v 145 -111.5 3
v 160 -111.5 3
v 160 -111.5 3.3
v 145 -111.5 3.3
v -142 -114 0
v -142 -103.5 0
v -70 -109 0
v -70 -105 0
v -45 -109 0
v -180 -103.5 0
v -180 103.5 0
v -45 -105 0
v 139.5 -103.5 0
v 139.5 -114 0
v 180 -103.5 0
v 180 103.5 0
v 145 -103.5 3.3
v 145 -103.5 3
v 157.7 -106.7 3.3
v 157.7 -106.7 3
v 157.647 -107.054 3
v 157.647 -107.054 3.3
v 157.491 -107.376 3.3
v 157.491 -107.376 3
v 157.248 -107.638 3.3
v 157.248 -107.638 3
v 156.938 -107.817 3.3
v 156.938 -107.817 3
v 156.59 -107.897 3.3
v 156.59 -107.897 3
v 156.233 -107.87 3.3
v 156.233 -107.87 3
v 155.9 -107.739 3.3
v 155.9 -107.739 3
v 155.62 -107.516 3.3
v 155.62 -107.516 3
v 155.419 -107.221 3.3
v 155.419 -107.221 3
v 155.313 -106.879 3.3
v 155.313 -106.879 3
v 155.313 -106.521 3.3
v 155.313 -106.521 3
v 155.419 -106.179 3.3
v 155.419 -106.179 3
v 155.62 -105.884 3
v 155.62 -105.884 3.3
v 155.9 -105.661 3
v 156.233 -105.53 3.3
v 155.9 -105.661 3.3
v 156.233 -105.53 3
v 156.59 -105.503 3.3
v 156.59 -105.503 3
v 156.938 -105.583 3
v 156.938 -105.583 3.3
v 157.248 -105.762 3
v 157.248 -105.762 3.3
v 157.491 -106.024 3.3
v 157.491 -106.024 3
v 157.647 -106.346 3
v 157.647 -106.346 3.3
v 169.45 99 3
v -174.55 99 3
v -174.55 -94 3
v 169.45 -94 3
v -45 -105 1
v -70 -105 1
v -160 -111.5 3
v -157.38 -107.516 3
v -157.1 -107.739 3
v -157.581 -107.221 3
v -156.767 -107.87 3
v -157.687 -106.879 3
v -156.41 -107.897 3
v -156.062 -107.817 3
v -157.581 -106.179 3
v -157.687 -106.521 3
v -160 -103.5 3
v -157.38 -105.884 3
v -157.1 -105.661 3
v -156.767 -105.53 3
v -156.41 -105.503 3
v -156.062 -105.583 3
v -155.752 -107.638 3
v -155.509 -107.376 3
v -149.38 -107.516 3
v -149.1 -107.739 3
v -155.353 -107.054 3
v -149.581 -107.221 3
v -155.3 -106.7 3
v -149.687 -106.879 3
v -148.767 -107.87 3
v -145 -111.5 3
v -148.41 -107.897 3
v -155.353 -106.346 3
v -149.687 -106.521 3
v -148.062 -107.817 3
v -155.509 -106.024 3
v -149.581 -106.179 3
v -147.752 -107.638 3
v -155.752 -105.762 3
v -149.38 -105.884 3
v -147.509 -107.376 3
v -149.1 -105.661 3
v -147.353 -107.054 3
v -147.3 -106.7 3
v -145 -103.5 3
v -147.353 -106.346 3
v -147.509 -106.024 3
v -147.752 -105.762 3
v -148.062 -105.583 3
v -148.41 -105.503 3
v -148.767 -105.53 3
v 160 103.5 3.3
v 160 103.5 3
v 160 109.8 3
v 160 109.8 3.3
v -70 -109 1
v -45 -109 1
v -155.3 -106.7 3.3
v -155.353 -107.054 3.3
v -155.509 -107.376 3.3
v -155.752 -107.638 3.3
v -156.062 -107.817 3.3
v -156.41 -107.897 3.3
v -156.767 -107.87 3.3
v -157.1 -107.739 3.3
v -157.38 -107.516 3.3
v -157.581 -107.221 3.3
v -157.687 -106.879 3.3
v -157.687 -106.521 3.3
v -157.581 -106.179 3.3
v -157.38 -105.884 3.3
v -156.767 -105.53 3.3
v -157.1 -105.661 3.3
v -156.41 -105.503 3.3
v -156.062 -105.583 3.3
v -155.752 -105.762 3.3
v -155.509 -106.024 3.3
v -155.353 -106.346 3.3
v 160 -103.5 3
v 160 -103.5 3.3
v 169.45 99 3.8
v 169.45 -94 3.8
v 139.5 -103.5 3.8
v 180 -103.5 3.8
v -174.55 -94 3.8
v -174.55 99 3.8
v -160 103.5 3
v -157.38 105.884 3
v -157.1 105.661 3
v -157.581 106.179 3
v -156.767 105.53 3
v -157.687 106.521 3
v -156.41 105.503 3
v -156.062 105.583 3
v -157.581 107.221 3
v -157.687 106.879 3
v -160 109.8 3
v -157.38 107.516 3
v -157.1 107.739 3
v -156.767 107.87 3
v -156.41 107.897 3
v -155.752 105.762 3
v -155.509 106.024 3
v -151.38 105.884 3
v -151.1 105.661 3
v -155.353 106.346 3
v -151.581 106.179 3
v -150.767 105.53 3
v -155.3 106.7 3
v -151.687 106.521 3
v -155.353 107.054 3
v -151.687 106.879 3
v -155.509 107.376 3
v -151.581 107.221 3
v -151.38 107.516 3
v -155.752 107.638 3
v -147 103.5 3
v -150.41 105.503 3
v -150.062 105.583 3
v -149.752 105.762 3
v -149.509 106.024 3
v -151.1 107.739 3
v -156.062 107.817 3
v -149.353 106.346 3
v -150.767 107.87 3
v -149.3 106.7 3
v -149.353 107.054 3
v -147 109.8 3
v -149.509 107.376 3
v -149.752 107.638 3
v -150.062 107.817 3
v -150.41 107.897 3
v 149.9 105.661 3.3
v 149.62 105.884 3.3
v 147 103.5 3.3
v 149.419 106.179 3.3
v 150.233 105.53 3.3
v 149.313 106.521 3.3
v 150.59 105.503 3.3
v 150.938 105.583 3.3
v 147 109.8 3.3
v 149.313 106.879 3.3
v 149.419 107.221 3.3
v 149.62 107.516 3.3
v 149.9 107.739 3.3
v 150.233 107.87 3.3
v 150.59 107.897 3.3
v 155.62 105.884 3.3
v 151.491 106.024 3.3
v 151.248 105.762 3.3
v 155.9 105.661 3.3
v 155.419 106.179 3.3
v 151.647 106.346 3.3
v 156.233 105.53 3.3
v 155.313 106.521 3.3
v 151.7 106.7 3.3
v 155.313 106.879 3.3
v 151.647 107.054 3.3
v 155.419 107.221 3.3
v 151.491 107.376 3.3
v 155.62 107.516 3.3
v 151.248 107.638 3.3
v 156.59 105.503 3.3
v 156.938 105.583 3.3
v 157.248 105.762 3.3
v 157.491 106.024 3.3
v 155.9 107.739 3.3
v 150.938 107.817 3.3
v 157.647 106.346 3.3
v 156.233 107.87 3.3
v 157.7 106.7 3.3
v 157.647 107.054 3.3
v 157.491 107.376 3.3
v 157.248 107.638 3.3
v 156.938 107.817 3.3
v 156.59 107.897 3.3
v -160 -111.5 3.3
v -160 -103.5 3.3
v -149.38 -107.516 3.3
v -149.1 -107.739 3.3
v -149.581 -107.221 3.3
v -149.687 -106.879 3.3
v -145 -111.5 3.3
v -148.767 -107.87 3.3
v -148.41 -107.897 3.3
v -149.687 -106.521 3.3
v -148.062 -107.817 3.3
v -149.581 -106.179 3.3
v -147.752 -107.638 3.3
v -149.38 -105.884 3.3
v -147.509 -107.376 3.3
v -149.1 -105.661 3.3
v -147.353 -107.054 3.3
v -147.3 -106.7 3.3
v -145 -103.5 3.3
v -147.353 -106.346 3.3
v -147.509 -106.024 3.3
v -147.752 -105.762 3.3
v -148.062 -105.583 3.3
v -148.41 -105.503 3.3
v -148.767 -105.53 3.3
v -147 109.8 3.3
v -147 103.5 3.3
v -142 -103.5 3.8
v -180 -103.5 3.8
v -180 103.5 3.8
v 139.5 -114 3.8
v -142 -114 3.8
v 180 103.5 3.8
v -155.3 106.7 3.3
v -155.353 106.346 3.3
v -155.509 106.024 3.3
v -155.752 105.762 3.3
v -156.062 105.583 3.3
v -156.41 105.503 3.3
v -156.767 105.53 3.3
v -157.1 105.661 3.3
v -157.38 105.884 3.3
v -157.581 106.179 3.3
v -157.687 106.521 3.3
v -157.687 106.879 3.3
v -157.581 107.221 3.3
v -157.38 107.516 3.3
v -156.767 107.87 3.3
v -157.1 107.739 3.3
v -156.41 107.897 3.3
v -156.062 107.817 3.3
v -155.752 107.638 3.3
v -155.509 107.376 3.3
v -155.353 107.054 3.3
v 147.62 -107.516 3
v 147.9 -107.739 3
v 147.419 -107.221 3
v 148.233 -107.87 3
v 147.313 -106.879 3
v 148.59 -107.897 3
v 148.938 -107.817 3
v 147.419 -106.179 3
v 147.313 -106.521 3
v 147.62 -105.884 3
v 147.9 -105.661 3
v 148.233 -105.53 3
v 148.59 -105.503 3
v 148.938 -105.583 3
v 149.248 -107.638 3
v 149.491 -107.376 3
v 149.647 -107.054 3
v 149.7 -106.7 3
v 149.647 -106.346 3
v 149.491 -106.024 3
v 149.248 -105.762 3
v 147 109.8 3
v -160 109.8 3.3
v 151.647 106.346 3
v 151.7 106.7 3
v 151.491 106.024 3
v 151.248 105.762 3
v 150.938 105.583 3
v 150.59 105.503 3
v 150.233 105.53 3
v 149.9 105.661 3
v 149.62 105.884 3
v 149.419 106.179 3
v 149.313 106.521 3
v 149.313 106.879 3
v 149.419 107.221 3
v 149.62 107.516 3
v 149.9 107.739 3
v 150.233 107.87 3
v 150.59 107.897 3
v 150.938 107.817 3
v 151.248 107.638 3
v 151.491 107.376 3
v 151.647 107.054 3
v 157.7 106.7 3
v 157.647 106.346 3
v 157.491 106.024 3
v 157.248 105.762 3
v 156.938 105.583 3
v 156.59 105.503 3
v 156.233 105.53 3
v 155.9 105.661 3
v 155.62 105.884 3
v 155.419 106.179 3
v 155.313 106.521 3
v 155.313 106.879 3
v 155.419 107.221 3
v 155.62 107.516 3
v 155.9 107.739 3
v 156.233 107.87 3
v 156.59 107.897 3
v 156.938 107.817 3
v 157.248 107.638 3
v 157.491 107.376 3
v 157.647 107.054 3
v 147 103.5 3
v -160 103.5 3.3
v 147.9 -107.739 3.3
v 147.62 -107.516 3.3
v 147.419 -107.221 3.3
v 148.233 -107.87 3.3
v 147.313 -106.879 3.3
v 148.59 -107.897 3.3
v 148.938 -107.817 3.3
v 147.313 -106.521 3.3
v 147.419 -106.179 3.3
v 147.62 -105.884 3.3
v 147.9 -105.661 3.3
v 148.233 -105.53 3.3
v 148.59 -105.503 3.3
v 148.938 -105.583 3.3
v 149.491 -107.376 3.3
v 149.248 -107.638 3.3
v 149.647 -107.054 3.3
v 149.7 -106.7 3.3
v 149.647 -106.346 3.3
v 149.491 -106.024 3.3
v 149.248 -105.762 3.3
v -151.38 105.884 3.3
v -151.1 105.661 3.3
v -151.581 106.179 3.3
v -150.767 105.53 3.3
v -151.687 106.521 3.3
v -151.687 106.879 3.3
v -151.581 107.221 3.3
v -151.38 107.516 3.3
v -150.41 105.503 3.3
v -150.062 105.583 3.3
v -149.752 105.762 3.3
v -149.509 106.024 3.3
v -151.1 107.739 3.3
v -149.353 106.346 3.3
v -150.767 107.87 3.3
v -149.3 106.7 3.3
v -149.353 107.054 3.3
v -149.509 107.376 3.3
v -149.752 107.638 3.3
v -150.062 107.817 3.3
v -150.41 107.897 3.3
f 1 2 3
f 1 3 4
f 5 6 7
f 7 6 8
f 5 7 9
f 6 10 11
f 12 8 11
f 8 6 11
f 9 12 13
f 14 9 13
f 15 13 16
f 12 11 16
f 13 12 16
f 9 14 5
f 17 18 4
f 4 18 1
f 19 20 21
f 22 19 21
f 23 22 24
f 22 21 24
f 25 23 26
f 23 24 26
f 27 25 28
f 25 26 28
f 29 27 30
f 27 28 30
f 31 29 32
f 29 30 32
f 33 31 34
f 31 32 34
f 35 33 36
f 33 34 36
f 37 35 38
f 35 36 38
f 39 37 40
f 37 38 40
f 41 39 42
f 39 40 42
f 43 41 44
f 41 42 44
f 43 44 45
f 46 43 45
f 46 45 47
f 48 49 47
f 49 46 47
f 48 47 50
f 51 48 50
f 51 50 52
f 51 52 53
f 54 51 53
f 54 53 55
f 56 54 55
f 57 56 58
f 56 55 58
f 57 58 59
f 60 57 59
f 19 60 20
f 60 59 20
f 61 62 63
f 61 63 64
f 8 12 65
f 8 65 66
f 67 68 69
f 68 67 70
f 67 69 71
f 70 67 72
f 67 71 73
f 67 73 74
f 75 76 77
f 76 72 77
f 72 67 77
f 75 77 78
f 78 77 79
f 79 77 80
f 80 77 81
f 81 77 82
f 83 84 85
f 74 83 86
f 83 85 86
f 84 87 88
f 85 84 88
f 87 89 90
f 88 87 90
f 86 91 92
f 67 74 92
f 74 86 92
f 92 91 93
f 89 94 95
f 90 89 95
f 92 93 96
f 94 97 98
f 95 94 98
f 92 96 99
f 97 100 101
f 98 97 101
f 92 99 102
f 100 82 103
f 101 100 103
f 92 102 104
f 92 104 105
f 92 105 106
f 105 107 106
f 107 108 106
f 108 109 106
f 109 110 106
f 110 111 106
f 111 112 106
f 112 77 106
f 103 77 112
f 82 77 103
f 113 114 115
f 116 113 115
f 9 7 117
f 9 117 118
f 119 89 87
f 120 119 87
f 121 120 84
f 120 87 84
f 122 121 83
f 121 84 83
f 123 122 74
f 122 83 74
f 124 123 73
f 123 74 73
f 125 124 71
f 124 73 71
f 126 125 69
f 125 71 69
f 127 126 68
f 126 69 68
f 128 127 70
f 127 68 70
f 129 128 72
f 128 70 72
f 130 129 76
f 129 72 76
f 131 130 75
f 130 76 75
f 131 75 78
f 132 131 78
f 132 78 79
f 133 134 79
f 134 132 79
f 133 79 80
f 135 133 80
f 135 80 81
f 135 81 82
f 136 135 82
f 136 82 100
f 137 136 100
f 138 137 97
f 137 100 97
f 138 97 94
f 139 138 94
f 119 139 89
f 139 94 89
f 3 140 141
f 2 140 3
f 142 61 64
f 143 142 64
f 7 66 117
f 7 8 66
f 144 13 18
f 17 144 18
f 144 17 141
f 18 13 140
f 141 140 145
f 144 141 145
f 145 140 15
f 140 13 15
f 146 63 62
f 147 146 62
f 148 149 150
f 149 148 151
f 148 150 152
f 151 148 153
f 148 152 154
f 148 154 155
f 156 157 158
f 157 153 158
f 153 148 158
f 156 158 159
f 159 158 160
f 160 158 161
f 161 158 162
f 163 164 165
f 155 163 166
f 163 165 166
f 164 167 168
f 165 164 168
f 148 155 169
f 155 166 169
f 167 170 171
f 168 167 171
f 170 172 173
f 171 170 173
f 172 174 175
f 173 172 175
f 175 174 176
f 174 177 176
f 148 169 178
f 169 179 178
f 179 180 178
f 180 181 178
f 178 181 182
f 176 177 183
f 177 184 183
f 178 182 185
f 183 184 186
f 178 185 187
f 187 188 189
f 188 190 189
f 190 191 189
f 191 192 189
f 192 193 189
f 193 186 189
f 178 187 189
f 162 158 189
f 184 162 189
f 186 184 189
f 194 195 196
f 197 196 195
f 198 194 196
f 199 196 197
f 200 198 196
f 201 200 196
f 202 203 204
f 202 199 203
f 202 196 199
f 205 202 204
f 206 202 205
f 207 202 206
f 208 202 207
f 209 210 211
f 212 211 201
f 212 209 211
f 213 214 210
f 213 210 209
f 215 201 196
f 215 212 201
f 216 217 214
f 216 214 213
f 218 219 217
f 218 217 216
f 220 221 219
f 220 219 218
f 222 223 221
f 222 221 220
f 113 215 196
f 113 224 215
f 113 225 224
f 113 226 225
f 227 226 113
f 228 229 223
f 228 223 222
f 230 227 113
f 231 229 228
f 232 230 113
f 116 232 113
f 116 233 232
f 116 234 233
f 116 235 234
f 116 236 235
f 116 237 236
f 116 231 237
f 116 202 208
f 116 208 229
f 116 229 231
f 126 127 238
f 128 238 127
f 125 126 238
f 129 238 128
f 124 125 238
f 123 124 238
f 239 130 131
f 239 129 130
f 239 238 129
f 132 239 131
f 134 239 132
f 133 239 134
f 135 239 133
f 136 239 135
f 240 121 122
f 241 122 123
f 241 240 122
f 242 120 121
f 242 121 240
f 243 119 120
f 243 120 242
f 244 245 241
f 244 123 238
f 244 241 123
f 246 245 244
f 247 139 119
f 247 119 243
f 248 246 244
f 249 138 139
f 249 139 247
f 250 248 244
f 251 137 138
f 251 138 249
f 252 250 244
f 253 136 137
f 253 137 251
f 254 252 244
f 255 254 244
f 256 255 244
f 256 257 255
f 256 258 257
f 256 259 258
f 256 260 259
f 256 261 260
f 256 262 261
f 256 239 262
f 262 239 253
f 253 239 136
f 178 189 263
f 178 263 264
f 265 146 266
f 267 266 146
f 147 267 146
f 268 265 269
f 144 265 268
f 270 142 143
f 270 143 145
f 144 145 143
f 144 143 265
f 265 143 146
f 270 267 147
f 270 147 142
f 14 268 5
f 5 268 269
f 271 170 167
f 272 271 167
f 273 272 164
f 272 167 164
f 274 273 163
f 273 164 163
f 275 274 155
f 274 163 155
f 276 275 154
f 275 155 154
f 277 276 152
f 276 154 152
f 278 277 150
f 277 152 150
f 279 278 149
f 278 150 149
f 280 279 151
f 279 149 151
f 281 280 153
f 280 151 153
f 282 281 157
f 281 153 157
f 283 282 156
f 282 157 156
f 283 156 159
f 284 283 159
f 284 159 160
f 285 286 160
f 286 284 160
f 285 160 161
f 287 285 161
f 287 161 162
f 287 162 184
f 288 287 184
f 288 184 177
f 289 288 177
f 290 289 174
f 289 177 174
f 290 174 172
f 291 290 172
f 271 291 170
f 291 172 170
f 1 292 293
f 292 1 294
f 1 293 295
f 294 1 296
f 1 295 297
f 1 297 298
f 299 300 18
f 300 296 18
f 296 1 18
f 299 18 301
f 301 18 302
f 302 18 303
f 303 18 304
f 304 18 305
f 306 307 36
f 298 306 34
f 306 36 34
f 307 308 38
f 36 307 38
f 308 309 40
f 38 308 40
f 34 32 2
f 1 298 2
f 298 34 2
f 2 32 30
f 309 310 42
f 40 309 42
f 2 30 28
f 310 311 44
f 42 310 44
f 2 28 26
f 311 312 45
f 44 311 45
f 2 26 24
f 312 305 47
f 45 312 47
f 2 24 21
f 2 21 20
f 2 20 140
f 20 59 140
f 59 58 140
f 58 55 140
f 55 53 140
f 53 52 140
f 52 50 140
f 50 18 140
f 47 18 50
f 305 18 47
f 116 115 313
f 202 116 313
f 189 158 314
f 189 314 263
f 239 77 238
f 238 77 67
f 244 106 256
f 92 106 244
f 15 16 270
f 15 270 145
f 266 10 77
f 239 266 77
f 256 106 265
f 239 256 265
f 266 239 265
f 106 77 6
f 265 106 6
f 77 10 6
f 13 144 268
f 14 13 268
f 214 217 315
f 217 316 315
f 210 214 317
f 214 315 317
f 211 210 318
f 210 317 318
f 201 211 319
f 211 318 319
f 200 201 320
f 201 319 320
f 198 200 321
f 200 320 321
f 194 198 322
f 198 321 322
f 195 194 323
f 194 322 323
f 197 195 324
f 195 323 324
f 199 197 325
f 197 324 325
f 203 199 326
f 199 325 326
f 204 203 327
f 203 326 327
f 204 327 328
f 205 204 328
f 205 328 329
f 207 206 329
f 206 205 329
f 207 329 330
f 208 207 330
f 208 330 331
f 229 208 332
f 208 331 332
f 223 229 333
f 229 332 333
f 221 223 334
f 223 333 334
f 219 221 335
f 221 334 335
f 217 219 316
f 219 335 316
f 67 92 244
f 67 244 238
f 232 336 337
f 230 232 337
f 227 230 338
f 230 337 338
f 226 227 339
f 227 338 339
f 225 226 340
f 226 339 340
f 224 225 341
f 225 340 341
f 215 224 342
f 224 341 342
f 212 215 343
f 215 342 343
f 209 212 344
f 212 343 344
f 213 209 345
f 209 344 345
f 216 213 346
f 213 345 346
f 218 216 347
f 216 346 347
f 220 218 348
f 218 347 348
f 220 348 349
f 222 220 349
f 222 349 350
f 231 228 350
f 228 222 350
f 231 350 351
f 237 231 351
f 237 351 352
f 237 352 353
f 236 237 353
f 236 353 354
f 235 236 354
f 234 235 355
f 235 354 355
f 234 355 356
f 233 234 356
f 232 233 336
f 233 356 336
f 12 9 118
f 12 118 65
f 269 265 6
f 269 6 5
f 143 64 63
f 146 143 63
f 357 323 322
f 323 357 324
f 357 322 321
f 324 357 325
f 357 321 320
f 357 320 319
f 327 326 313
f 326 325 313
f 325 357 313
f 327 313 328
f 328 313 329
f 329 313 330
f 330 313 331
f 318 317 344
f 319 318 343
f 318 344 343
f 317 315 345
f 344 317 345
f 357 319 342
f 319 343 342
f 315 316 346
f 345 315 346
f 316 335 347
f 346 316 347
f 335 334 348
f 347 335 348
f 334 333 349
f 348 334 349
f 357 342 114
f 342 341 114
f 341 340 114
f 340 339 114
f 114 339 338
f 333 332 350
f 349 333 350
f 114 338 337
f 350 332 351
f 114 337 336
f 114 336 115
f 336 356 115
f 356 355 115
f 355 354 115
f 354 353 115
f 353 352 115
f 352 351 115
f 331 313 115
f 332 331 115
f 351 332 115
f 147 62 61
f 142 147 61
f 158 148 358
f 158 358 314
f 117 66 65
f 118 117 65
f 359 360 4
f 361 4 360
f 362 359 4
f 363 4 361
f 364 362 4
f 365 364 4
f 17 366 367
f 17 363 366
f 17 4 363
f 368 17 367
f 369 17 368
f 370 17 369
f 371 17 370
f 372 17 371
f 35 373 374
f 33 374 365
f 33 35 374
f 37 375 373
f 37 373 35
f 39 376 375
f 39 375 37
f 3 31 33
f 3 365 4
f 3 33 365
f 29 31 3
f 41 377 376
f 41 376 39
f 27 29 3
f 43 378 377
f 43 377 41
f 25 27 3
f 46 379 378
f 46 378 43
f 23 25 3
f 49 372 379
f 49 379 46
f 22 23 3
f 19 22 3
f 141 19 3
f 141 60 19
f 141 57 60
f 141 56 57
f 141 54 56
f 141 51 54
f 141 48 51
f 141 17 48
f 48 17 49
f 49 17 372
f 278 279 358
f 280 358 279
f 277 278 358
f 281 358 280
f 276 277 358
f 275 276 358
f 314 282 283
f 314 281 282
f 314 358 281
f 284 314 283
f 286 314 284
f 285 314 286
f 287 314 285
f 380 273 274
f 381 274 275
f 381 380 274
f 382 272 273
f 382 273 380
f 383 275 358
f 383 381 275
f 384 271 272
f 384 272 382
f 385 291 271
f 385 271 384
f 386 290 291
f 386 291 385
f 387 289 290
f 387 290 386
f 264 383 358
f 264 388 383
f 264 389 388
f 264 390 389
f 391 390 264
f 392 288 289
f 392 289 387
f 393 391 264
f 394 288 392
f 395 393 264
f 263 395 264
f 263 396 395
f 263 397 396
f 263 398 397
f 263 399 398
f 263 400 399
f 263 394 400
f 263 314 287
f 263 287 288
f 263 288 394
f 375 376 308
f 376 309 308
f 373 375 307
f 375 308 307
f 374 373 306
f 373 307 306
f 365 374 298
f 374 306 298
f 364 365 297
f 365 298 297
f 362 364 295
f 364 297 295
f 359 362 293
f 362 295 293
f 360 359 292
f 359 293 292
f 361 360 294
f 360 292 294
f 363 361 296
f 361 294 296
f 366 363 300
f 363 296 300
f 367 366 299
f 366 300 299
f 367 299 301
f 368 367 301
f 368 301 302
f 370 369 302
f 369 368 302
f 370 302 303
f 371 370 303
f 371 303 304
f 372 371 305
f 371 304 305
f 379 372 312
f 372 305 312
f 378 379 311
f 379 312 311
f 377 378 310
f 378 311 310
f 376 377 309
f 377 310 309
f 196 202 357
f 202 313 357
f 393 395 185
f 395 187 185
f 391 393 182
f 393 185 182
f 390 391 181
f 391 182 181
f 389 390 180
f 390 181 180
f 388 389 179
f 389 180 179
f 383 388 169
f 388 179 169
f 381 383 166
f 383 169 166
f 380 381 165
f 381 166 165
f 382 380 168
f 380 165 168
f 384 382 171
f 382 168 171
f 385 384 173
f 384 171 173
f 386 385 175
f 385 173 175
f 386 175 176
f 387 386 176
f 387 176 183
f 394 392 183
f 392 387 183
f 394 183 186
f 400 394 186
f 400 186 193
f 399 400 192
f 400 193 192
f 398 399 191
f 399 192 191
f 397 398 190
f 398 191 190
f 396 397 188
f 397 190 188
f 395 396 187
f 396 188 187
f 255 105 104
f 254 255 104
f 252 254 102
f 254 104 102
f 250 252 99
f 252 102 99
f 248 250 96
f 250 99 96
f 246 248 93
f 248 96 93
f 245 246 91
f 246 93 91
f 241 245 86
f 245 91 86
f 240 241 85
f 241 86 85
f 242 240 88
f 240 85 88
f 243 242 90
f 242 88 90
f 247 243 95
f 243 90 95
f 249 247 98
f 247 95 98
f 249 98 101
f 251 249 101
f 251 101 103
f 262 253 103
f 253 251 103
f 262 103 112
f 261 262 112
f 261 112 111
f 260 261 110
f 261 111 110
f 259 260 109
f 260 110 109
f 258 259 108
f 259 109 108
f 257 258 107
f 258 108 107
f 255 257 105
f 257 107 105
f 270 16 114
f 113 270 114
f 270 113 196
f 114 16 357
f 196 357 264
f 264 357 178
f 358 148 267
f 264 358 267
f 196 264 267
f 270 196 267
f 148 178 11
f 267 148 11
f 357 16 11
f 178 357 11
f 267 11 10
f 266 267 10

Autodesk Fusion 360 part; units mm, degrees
sketch "Panel_Dims" plane through (0, 0, 0) normal (0, 0, 1) x (1, 0, 0)
  line L0 (-180, 103.5) -> (180, 103.5) construction
  line L1 (180, 103.5) -> (180, -103.5) construction
  line L2 (180, -103.5) -> (-180, -103.5) construction
  line L3 (-180, -103.5) -> (-180, 103.5) construction
  line L4 (0, 0) -> (0, 103.5) construction
  line L5 (0, 0) -> (-180, 0) construction
  line L6 (-160, -103.5) -> (-160, -111.5)
  line L7 (-145, -103.5) -> (-145, -111.5)
  line L8 (-145, -111.5) -> (-160, -111.5)
  line L9 (-142, -103.5) -> (-142, -114)
  line L10 (160, -103.5) -> (160, -111.5)
  line L11 (145, -103.5) -> (145, -111.5)
  line L12 (160, -111.5) -> (145, -111.5)
  line L13 (139.5, -103.5) -> (139.5, -114)
  line L14 (139.5, -114) -> (-142, -114)
  line L15 (-160, 103.5) -> (-160, 109.8)
  line L16 (-160, 109.8) -> (-147, 109.8)
  line L17 (-147, 109.8) -> (-147, 103.5)
  line L18 (160, 103.5) -> (160, 109.8)
  line L19 (160, 109.8) -> (147, 109.8)
  line L20 (147, 109.8) -> (147, 103.5)
  line L21 (-180, 103.5) -> (-180, -103.5)
  line L22 (-180, -103.5) -> (-160, -103.5)
  line L23 (-145, -103.5) -> (-142, -103.5)
  line L24 (145, -103.5) -> (139.5, -103.5)
  line L25 (160, -103.5) -> (180, -103.5)
  line L26 (180, 103.5) -> (180, -103.5)
  line L27 (-160, 103.5) -> (-180, 103.5)
  line L28 (-147, 103.5) -> (147, 103.5)
  line L29 (160, 103.5) -> (180, 103.5)
  line L30 (-142, -103.5) -> (139.5, -103.5)
  circle A0 centre (-156.5, -106.7) radius 1.2
  circle A1 centre (-148.5, -106.7) radius 1.2
  line L31 (-156.5, -106.7) -> (-148.5, -106.7) construction
  circle A2 centre (148.5, -106.7) radius 1.2
  line L32 (148.5, -106.7) -> (156.5, -106.7) construction
  circle A3 centre (156.5, -106.7) radius 1.2
  circle A4 centre (-156.5, 106.7) radius 1.2
  line L33 (-156.5, 106.7) -> (-150.5, 106.7) construction
  circle A5 centre (-150.5, 106.7) radius 1.2
  circle A6 centre (150.5, 106.7) radius 1.2
  line L34 (150.5, 106.7) -> (156.5, 106.7) construction
  circle A7 centre (156.5, 106.7) radius 1.2
  line L35 (-174.55, 99) -> (169.45, 99)
  line L36 (169.45, 99) -> (169.45, -94)
  line L37 (169.45, -94) -> (-174.55, -94)
  line L38 (-174.55, -94) -> (-174.55, 99)
  line L39 (145, -103.5) -> (160, -103.5)
  line L40 (147, 103.5) -> (160, 103.5)
  line L41 (-147, 103.5) -> (-160, 103.5)
  line L42 (-160, -103.5) -> (-145, -103.5)
  line L43 (-73, -103.5) -> (-43, -103.5)
  line L44 (-43, -103.5) -> (-43, -114)
  line L45 (-43, -114) -> (-73, -114)
  line L46 (-73, -114) -> (-73, -103.5)
  line L47 (-45, -105) -> (-70, -105)
  line L48 (-70, -105) -> (-70, -109)
  line L49 (-70, -109) -> (-45, -109)
  line L50 (-45, -109) -> (-45, -105)
  point P0 (-156.5, -106.7)
  dimension "panel_w" = 360
  dimension "panel_h" = 207
  dimension "ear_indent" = 20
  dimension "ear_bottom_w" = 15
  dimension "ear_bottom_h" = 8
  dimension "pcb_left_indent" = 38
  dimension "d37" = 20
  dimension "d40" = 8
  dimension "pcb_chin_h" = 10.5
  dimension "pcb_chin_w" = 281.5
  dimension "d45" = 20
  dimension "ear_top_h" = 6.3
  dimension "ear_top_w" = 13
  dimension "d48" = 20
  dimension "d49" = 6.3
  dimension "d50" = 13
  dimension "hole_dist_x" = 3.5
  dimension "hole_dia" = 2.4
  dimension "hole_dist_y" = 3.2
  dimension "d54" = 2.4
  dimension "hole_bottom_ipd" = 8
  dimension "d62" = 2.4
  dimension "d63" = 2.4
  dimension "d64" = 8
  dimension "d65" = 3.2
  dimension "d66" = 3.5
  dimension "d67" = 2.4
  dimension "d68" = 2.4
  dimension "hole_top_ipd" = 6
  dimension "d70" = 3.5
  dimension "d72" = 3.2
  dimension "d73" = 2.4
  dimension "d74" = 2.4
  dimension "d75" = 6
  dimension "d76" = 3.5
  dimension "d77" = 3.2
  dimension "bezel_left" = 5.45
  dimension "bezel_top" = 4.5
  dimension "active_w" = 344
  dimension "active_h" = 193
  dimension "d98" = 30
  dimension "d99" = 10.5
  dimension "d100" = 137
  dimension "d101" = 25
  dimension "d102" = 4
  dimension "d103" = 5
  dimension "d104" = 2
extrude "Extrude2" add sketch "Panel_Dims" against normal blind 3.8 from surface at 3.8 contours L9 L14 L30 L46 | L14 L30 L43 L44 L45 L46 | L13 L14 L30 L44 | L47 L48 L49 L50 makes body 1
extrude "Extrude4" add sketch "Panel_Dims" along normal blind 3 separate body contours L35 L36 L37 L38 makes body 2
extrude "Extrude5" add sketch "Panel_Dims" along normal blind 3.8 contours L21 L22 L23 L24 L25 L26 L27 L28 L29 L30 L39 L40 L41 L42 L43 bodies 1 2
extrude "Extrude6" add sketch "Panel_Dims" along normal blind 0.3 from surface at 3 contours L6 L7 L8 L42 | L15 L16 L17 L41 | L18 L19 L20 L40 | L10 L11 L12 L39 bodies 1
extrude "Extrude7" cut sketch "Panel_Dims" along normal blind 1 contours L47 L48 L49 L50 bodies 1
equation "d37 = ear_indent"
equation "d40 = ear_bottom_h"
equation "d45 = ear_indent"
equation "d48 = ear_indent"
equation "d49 = ear_top_h"
equation "d50 = ear_top_w"
equation "d54 = hole_dia"
equation "d62 = hole_dia"
equation "d63 = hole_dia"
equation "d64 = hole_bottom_ipd"
equation "d65 = hole_dist_y"
equation "d66 = hole_dist_x"
equation "d67 = hole_dia"
equation "d68 = hole_dia"
equation "d70 = hole_dist_x"
equation "d72 = hole_dist_y"
equation "d73 = hole_dia"
equation "d74 = hole_dia"
equation "d75 = hole_top_ipd"
equation "d76 = hole_dist_x"
equation "d77 = hole_dist_y"
equation "pcb_thickness = -3,8 mm"
equation "screen_thicc = panel_thicc - 0,8 mm"
equation "panel_thicc = 3,8 mm"
equation "d94 = screen_thicc"
equation "d97 = panel_thicc"
